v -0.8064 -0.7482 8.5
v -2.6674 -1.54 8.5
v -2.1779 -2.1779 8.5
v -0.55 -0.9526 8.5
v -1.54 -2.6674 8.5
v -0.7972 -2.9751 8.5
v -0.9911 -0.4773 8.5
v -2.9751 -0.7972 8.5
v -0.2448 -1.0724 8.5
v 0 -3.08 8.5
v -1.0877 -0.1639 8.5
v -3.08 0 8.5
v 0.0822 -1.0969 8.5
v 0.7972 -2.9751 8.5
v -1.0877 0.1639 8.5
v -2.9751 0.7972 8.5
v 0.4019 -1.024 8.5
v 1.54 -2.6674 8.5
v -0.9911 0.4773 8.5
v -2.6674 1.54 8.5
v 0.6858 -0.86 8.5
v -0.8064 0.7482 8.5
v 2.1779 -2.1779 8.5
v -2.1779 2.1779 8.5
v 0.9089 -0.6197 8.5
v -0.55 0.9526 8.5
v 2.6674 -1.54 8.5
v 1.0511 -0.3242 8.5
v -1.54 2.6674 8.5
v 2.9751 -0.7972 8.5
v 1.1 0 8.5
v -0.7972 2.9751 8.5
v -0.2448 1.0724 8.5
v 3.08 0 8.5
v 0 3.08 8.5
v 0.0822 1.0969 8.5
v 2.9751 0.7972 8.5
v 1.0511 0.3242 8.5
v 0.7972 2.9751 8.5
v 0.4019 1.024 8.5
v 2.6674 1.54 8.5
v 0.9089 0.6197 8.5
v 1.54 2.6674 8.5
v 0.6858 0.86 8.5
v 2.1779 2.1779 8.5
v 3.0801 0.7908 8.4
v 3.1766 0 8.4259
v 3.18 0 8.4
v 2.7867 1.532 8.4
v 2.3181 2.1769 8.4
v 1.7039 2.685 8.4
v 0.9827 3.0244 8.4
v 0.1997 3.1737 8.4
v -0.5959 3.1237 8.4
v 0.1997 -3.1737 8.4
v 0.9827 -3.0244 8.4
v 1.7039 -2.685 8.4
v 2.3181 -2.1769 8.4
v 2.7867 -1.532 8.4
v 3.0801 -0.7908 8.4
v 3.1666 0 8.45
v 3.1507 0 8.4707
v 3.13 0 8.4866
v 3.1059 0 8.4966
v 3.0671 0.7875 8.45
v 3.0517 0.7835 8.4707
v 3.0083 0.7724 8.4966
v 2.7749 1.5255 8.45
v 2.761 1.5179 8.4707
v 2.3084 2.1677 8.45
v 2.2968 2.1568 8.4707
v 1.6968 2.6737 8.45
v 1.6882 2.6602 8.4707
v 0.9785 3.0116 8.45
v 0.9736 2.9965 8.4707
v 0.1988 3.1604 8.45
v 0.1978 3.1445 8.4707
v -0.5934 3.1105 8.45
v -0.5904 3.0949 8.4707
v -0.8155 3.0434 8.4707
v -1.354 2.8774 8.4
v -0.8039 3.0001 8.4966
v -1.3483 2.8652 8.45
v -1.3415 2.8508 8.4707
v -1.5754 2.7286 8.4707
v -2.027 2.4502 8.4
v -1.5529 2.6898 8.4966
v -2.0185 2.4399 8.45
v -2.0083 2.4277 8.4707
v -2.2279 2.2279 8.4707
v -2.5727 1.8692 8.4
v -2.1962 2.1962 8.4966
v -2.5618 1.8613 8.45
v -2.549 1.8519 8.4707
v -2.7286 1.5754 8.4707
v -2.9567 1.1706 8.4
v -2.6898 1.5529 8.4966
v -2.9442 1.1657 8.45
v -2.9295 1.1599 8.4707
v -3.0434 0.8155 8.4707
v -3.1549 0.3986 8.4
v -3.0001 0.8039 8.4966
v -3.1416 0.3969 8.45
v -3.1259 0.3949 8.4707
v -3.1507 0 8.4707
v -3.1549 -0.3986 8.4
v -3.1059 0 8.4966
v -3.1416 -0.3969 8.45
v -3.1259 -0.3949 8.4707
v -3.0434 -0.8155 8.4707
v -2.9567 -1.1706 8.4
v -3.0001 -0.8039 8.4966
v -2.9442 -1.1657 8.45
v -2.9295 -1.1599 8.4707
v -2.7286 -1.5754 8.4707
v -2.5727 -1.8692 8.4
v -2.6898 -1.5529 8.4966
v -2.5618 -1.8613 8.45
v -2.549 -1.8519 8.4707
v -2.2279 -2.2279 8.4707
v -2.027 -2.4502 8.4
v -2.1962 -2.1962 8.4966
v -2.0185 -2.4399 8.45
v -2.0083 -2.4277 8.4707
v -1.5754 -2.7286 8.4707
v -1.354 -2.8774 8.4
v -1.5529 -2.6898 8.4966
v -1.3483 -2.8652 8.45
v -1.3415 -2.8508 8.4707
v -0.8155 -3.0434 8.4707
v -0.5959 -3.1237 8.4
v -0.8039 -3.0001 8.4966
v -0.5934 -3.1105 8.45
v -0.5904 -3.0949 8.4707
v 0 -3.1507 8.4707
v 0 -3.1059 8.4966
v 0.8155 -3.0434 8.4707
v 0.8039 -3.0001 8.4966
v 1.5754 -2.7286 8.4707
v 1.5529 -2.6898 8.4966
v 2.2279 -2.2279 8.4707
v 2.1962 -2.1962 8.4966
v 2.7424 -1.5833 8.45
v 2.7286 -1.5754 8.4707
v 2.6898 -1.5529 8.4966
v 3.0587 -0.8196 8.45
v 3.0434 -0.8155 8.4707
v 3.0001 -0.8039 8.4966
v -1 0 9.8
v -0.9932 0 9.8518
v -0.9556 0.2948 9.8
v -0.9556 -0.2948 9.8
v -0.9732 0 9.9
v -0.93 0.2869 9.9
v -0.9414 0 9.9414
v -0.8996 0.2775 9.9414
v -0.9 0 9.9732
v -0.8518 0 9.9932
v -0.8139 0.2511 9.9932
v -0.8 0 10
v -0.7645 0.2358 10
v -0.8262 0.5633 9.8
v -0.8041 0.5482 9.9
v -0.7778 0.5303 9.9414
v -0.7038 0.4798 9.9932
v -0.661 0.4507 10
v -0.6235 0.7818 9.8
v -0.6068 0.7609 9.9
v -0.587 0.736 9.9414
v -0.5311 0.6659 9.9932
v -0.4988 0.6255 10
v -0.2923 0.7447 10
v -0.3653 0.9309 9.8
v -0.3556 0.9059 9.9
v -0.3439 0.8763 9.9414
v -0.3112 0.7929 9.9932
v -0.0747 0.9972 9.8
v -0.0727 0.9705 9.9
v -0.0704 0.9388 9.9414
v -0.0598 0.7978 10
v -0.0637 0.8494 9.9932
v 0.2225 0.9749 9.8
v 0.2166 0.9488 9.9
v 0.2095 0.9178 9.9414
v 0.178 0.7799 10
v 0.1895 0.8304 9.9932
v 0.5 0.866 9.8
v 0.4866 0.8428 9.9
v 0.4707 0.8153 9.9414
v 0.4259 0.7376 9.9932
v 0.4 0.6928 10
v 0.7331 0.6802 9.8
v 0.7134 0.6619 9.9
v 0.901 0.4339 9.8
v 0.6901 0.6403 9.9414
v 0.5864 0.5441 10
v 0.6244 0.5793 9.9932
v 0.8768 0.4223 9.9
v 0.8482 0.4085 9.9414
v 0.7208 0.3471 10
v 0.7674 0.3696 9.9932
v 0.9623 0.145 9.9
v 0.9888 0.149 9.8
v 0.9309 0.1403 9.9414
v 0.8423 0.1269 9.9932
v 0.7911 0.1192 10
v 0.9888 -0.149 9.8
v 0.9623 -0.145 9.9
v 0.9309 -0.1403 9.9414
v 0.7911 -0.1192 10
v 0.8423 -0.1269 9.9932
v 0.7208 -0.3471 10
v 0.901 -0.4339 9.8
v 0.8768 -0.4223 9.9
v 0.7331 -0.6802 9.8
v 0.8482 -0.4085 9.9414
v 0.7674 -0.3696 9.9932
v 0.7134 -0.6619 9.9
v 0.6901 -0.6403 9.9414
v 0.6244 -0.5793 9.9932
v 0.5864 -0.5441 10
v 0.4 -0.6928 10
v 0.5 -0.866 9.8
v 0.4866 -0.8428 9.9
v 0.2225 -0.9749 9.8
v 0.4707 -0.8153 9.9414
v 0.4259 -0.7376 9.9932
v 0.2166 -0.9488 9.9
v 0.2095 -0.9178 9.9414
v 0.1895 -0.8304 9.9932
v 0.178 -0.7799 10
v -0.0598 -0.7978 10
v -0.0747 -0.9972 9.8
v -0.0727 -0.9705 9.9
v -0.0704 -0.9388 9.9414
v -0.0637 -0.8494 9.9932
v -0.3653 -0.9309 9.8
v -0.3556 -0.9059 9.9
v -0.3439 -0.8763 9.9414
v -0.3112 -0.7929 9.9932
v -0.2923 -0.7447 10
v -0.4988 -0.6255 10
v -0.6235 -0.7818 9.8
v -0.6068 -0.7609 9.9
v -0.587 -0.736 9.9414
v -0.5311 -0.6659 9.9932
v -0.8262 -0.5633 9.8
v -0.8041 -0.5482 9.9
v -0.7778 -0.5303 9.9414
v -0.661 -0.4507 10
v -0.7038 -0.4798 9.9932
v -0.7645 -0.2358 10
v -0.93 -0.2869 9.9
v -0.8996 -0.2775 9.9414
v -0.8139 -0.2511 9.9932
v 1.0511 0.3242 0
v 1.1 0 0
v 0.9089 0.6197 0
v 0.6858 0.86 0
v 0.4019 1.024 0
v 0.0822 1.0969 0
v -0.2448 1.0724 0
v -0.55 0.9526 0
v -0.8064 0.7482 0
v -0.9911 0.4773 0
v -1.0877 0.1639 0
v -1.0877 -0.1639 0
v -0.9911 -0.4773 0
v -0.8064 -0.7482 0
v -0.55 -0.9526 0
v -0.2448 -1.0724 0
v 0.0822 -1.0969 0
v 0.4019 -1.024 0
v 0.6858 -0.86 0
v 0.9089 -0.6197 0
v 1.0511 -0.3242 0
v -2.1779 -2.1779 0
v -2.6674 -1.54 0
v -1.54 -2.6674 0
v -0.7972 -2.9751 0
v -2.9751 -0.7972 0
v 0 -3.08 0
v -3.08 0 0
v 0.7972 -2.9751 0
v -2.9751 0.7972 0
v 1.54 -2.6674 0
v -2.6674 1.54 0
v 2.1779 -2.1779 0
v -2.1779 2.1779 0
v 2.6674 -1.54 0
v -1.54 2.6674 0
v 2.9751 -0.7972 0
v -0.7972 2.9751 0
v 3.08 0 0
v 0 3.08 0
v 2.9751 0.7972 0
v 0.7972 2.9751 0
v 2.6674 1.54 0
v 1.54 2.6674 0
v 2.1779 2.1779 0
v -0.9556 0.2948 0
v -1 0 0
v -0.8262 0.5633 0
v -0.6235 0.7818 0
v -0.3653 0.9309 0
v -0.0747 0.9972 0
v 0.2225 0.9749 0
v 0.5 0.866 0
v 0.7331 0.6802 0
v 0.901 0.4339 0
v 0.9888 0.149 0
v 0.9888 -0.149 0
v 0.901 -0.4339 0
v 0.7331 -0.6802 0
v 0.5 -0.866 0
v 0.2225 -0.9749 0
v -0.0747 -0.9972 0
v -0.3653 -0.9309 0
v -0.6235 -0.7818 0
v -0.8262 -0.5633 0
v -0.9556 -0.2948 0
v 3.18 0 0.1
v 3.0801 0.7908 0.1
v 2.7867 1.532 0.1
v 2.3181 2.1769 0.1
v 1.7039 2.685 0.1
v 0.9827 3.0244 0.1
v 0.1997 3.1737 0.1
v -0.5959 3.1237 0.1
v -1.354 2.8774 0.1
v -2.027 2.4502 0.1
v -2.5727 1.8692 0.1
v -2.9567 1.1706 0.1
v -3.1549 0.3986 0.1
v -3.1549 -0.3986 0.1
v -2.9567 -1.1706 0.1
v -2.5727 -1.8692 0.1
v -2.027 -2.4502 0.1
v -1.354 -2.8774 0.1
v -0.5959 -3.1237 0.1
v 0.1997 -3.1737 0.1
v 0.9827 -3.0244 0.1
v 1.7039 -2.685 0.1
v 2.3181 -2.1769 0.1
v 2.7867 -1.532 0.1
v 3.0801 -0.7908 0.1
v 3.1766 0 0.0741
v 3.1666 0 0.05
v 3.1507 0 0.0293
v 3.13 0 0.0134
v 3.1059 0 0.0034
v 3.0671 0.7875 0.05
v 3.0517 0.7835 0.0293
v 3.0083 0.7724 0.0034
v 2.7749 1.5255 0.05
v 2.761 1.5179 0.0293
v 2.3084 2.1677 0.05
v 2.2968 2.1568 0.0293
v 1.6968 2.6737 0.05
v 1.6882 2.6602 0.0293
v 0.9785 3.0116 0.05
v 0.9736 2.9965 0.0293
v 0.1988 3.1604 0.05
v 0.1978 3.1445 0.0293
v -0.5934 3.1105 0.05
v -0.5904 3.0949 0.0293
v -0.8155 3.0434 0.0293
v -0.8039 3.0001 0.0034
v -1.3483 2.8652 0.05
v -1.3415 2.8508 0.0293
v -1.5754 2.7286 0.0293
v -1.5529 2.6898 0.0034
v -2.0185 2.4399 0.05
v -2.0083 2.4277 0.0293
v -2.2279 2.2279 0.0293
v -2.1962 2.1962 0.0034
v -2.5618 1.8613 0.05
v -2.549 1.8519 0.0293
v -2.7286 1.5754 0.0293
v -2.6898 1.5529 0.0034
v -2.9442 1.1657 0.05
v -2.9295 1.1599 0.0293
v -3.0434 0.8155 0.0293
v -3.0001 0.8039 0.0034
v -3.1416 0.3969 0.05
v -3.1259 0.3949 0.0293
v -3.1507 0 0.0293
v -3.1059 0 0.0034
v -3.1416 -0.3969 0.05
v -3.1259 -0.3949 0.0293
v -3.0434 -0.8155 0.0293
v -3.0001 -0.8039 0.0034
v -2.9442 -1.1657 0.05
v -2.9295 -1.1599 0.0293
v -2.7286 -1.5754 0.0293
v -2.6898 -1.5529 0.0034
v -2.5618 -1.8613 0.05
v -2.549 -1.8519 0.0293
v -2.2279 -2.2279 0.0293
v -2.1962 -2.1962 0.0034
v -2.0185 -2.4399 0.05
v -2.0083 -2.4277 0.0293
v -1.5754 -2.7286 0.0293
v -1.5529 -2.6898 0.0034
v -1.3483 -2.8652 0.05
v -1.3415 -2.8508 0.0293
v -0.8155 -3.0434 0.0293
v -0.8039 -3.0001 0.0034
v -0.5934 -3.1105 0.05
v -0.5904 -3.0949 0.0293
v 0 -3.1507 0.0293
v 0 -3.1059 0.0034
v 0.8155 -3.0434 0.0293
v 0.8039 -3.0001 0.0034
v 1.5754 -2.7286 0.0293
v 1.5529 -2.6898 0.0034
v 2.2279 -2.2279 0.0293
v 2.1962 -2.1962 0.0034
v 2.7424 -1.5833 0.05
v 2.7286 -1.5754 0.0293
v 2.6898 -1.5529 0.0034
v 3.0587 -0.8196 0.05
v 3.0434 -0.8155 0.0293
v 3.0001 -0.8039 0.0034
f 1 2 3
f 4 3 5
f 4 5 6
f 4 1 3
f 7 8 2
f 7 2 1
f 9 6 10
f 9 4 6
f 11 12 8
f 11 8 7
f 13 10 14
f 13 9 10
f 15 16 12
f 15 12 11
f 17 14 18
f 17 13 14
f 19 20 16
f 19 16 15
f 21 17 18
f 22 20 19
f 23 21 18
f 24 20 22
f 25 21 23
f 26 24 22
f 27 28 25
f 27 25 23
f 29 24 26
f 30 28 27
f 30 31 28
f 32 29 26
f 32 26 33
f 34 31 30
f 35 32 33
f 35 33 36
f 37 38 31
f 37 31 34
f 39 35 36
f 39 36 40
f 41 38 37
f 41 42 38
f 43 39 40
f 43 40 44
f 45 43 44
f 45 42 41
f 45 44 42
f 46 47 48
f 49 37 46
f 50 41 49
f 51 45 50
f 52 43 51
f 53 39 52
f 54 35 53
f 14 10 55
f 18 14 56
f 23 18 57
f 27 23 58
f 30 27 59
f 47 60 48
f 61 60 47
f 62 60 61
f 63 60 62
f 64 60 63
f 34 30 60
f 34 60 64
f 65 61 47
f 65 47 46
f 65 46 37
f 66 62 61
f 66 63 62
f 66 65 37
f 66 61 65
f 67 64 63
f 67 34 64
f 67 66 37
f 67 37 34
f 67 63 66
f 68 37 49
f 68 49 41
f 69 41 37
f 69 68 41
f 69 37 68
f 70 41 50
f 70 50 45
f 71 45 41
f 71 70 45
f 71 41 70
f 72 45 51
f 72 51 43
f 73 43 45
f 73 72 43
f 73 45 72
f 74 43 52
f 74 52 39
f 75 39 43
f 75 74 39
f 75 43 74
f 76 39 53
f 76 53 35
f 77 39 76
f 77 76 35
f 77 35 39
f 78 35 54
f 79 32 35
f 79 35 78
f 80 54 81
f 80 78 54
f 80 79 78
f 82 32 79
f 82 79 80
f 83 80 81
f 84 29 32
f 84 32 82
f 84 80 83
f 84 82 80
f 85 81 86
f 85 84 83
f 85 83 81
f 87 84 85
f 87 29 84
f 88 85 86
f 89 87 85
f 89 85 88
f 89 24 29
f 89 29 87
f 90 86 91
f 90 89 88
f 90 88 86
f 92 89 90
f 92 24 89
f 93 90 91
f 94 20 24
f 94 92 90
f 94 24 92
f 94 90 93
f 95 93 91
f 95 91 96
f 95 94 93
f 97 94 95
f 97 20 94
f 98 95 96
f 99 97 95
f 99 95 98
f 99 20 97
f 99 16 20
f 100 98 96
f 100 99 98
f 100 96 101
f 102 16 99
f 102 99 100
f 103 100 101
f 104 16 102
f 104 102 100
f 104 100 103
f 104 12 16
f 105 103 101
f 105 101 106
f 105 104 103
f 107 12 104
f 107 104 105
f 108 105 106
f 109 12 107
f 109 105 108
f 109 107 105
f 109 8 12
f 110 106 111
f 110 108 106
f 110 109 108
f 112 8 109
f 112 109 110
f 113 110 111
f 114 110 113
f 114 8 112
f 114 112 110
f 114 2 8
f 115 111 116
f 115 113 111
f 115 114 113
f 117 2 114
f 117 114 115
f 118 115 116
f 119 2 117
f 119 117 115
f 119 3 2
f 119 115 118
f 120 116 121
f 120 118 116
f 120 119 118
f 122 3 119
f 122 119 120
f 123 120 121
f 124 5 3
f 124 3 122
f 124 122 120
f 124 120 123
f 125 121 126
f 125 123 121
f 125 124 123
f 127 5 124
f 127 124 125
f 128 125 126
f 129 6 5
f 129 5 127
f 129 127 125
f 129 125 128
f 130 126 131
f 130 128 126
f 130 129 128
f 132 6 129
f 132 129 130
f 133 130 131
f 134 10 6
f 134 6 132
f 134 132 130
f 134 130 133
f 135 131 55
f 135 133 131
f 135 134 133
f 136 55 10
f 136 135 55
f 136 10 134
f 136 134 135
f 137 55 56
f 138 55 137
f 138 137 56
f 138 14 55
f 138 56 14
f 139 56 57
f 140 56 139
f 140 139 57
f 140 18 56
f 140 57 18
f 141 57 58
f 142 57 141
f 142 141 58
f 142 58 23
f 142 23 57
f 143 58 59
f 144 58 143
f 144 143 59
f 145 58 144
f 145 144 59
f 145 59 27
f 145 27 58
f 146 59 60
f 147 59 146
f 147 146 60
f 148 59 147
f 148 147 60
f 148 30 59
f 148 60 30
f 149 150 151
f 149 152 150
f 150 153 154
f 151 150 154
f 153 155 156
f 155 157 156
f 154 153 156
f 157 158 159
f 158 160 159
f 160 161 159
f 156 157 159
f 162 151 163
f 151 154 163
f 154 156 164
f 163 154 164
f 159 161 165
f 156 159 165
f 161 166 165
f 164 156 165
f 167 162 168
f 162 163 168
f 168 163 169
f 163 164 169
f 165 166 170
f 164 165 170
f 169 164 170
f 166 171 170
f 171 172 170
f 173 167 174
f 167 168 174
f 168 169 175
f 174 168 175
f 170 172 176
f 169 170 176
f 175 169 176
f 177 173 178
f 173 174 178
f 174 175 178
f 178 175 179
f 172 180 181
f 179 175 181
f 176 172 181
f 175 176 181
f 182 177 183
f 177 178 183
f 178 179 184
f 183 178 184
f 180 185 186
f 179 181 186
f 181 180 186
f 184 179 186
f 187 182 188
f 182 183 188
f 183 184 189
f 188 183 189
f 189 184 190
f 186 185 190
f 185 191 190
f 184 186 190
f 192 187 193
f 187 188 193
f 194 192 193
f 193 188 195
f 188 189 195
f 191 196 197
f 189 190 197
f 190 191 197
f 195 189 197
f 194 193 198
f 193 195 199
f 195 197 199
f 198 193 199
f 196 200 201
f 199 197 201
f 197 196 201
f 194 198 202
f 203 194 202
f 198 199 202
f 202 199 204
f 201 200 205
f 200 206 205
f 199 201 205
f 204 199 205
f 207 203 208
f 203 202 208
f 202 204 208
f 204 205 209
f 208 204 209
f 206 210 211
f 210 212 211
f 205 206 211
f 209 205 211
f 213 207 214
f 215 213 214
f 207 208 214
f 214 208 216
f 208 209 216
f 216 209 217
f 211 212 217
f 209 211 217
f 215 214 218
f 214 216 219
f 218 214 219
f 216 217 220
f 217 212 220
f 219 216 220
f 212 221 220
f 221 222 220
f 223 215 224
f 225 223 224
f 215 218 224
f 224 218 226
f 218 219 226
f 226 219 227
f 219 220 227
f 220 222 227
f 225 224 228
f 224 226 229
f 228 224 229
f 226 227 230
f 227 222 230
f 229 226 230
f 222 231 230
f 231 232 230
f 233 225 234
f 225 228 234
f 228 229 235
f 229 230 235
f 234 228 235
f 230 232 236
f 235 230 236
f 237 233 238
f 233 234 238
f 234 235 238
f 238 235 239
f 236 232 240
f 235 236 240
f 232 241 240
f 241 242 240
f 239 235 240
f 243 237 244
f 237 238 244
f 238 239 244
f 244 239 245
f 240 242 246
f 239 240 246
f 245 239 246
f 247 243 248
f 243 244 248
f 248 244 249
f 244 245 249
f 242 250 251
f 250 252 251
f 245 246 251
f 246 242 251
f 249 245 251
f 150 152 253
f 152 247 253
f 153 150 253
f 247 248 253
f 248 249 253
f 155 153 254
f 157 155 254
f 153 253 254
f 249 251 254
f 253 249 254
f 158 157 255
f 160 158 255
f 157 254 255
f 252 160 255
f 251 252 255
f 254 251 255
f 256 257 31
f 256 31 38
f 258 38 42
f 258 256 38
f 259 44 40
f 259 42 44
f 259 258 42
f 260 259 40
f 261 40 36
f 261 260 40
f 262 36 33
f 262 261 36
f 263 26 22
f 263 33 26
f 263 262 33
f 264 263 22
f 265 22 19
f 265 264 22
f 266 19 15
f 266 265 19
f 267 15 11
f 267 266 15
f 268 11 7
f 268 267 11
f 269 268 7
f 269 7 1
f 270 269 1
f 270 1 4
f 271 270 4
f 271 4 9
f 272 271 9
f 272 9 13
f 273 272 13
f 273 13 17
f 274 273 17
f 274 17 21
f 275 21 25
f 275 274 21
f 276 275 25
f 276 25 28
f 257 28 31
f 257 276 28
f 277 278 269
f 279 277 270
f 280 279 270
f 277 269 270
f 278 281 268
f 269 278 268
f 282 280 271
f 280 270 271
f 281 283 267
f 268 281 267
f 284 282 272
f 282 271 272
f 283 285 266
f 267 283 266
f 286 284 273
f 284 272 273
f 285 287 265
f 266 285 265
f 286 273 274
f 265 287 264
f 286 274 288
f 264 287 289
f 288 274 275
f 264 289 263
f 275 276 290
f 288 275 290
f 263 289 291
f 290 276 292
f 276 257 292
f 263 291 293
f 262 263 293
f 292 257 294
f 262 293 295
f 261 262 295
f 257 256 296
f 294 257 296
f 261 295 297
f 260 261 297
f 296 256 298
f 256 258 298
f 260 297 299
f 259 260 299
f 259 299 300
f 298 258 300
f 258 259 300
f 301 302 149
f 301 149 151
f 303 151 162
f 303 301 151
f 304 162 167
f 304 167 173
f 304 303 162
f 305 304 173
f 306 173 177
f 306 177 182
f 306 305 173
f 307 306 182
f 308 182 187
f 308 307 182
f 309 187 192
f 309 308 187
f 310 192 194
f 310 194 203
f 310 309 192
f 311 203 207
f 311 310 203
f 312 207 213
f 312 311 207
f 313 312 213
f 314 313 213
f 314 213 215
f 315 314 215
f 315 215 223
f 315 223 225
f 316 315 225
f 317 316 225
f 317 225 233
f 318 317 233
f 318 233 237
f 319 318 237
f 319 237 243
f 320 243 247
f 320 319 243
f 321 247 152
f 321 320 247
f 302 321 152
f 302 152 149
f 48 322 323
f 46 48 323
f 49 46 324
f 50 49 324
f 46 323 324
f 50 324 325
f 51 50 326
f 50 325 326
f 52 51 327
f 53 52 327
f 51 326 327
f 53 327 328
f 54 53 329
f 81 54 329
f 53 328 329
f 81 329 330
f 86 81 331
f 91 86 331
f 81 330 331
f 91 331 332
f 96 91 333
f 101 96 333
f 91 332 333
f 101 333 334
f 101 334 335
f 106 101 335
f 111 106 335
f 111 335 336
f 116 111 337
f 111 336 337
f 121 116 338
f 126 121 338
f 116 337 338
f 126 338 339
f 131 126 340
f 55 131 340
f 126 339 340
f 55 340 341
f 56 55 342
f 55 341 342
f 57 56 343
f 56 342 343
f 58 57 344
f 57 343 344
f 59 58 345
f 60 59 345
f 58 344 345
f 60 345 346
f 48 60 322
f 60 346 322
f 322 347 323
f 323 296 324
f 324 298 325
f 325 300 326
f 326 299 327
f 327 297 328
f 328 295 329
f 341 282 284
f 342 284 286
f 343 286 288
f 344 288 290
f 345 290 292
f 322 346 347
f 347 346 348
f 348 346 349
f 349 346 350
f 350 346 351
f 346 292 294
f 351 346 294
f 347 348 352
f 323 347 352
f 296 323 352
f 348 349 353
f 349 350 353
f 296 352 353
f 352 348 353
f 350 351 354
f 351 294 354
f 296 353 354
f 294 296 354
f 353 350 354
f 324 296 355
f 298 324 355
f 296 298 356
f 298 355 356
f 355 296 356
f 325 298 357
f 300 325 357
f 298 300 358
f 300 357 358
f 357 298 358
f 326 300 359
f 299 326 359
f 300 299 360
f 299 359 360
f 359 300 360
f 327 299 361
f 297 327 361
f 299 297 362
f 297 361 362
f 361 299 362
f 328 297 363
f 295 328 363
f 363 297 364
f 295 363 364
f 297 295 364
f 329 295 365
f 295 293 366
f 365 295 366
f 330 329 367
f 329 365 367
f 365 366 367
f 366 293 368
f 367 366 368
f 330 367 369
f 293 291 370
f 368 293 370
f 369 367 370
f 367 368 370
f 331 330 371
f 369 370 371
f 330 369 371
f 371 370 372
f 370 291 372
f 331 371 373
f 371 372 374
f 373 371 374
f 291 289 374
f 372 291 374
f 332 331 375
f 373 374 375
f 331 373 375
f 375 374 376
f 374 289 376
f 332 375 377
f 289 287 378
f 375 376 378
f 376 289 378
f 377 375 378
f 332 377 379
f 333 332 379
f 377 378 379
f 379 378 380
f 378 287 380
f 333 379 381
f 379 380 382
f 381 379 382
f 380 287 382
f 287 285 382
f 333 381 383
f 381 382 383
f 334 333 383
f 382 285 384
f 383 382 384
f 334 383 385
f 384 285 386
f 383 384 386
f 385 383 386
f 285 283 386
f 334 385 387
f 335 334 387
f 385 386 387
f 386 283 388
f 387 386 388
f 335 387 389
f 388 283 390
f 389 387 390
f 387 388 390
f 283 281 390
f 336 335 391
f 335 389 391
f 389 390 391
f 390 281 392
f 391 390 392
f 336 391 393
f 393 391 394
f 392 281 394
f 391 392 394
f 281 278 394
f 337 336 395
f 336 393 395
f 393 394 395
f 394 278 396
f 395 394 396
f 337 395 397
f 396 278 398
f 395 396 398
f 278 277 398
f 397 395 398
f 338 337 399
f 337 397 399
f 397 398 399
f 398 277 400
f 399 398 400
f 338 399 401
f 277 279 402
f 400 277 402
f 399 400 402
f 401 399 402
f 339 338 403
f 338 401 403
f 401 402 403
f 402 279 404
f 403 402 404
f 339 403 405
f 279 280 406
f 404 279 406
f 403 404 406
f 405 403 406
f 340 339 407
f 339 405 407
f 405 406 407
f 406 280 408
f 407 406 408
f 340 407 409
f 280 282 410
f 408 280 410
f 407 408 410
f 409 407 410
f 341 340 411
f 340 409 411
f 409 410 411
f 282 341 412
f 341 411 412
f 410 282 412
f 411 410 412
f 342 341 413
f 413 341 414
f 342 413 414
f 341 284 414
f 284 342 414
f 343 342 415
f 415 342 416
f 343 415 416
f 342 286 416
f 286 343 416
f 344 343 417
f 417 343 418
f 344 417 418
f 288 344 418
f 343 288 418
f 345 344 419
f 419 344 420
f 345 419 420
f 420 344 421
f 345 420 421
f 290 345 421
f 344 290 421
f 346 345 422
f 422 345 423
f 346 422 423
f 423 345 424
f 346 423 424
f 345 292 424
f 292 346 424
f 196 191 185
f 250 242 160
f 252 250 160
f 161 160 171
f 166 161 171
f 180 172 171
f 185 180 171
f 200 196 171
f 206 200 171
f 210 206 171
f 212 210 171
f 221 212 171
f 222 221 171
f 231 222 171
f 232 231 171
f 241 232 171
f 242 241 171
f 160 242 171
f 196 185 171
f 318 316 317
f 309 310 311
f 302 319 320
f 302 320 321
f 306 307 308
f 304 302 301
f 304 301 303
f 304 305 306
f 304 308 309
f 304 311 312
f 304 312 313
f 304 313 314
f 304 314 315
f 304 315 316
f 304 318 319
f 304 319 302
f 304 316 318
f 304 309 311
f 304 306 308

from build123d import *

# Parameters (mm, degrees)
SKETCH1_R               = 3.18
BOSS_EXTRUDE1_DEPTH     = 8.5
CUT_EXTRUDE1_DEPTH      = 10.616381856
CUT_EXTRUDE1_DEPTH_BACK = 10.616381856
SKETCH2_R               = 1.1
SKETCH3_R               = 1
BOSS_EXTRUDE2_DEPTH     = 10
FILLET1_R               = 0.2
FILLET2_R               = 0.1
FILLET3_R               = 0.1


with BuildPart() as part:
    # Sketch1 → Boss-Extrude1 (new body)
    with BuildSketch(Plane.XY):
        Circle(SKETCH1_R)
    extrude(amount=BOSS_EXTRUDE1_DEPTH)

    # Sketch2 → Cut-Extrude1 (cut, two sides: drawn at the far end of the back side and taken through both)
    with BuildSketch(Plane.XY.offset(8.5).offset(-CUT_EXTRUDE1_DEPTH_BACK)):
        Circle(SKETCH2_R)
    extrude(amount=CUT_EXTRUDE1_DEPTH + CUT_EXTRUDE1_DEPTH_BACK, mode=Mode.SUBTRACT)

    # Fillet2
    fillet2_edges = [part.edges().sort_by_distance(p)[0] for p in [
        (-3.18, 0, 8.5),
    ]]
    fillet(fillet2_edges, radius=FILLET2_R)

    # Fillet3
    fillet3_edges = [part.edges().sort_by_distance(p)[0] for p in [
        (-3.18, 0, 0),
    ]]
    fillet(fillet3_edges, radius=FILLET3_R)


with BuildPart() as body_2:
    # Sketch3 → Boss-Extrude2 (new body)
    with BuildSketch(Plane(origin=(0, 0, 0), x_dir=(-1, 0, 0), z_dir=(0, 0, -1))):
        Circle(SKETCH3_R)
    extrude(amount=-BOSS_EXTRUDE2_DEPTH)

    # Fillet1
    fillet1_edges = [body_2.edges().sort_by_distance(p)[0] for p in [
        (1, 0, 10),
    ]]
    fillet(fillet1_edges, radius=FILLET1_R)


solid = Compound([part.part, body_2.part])
